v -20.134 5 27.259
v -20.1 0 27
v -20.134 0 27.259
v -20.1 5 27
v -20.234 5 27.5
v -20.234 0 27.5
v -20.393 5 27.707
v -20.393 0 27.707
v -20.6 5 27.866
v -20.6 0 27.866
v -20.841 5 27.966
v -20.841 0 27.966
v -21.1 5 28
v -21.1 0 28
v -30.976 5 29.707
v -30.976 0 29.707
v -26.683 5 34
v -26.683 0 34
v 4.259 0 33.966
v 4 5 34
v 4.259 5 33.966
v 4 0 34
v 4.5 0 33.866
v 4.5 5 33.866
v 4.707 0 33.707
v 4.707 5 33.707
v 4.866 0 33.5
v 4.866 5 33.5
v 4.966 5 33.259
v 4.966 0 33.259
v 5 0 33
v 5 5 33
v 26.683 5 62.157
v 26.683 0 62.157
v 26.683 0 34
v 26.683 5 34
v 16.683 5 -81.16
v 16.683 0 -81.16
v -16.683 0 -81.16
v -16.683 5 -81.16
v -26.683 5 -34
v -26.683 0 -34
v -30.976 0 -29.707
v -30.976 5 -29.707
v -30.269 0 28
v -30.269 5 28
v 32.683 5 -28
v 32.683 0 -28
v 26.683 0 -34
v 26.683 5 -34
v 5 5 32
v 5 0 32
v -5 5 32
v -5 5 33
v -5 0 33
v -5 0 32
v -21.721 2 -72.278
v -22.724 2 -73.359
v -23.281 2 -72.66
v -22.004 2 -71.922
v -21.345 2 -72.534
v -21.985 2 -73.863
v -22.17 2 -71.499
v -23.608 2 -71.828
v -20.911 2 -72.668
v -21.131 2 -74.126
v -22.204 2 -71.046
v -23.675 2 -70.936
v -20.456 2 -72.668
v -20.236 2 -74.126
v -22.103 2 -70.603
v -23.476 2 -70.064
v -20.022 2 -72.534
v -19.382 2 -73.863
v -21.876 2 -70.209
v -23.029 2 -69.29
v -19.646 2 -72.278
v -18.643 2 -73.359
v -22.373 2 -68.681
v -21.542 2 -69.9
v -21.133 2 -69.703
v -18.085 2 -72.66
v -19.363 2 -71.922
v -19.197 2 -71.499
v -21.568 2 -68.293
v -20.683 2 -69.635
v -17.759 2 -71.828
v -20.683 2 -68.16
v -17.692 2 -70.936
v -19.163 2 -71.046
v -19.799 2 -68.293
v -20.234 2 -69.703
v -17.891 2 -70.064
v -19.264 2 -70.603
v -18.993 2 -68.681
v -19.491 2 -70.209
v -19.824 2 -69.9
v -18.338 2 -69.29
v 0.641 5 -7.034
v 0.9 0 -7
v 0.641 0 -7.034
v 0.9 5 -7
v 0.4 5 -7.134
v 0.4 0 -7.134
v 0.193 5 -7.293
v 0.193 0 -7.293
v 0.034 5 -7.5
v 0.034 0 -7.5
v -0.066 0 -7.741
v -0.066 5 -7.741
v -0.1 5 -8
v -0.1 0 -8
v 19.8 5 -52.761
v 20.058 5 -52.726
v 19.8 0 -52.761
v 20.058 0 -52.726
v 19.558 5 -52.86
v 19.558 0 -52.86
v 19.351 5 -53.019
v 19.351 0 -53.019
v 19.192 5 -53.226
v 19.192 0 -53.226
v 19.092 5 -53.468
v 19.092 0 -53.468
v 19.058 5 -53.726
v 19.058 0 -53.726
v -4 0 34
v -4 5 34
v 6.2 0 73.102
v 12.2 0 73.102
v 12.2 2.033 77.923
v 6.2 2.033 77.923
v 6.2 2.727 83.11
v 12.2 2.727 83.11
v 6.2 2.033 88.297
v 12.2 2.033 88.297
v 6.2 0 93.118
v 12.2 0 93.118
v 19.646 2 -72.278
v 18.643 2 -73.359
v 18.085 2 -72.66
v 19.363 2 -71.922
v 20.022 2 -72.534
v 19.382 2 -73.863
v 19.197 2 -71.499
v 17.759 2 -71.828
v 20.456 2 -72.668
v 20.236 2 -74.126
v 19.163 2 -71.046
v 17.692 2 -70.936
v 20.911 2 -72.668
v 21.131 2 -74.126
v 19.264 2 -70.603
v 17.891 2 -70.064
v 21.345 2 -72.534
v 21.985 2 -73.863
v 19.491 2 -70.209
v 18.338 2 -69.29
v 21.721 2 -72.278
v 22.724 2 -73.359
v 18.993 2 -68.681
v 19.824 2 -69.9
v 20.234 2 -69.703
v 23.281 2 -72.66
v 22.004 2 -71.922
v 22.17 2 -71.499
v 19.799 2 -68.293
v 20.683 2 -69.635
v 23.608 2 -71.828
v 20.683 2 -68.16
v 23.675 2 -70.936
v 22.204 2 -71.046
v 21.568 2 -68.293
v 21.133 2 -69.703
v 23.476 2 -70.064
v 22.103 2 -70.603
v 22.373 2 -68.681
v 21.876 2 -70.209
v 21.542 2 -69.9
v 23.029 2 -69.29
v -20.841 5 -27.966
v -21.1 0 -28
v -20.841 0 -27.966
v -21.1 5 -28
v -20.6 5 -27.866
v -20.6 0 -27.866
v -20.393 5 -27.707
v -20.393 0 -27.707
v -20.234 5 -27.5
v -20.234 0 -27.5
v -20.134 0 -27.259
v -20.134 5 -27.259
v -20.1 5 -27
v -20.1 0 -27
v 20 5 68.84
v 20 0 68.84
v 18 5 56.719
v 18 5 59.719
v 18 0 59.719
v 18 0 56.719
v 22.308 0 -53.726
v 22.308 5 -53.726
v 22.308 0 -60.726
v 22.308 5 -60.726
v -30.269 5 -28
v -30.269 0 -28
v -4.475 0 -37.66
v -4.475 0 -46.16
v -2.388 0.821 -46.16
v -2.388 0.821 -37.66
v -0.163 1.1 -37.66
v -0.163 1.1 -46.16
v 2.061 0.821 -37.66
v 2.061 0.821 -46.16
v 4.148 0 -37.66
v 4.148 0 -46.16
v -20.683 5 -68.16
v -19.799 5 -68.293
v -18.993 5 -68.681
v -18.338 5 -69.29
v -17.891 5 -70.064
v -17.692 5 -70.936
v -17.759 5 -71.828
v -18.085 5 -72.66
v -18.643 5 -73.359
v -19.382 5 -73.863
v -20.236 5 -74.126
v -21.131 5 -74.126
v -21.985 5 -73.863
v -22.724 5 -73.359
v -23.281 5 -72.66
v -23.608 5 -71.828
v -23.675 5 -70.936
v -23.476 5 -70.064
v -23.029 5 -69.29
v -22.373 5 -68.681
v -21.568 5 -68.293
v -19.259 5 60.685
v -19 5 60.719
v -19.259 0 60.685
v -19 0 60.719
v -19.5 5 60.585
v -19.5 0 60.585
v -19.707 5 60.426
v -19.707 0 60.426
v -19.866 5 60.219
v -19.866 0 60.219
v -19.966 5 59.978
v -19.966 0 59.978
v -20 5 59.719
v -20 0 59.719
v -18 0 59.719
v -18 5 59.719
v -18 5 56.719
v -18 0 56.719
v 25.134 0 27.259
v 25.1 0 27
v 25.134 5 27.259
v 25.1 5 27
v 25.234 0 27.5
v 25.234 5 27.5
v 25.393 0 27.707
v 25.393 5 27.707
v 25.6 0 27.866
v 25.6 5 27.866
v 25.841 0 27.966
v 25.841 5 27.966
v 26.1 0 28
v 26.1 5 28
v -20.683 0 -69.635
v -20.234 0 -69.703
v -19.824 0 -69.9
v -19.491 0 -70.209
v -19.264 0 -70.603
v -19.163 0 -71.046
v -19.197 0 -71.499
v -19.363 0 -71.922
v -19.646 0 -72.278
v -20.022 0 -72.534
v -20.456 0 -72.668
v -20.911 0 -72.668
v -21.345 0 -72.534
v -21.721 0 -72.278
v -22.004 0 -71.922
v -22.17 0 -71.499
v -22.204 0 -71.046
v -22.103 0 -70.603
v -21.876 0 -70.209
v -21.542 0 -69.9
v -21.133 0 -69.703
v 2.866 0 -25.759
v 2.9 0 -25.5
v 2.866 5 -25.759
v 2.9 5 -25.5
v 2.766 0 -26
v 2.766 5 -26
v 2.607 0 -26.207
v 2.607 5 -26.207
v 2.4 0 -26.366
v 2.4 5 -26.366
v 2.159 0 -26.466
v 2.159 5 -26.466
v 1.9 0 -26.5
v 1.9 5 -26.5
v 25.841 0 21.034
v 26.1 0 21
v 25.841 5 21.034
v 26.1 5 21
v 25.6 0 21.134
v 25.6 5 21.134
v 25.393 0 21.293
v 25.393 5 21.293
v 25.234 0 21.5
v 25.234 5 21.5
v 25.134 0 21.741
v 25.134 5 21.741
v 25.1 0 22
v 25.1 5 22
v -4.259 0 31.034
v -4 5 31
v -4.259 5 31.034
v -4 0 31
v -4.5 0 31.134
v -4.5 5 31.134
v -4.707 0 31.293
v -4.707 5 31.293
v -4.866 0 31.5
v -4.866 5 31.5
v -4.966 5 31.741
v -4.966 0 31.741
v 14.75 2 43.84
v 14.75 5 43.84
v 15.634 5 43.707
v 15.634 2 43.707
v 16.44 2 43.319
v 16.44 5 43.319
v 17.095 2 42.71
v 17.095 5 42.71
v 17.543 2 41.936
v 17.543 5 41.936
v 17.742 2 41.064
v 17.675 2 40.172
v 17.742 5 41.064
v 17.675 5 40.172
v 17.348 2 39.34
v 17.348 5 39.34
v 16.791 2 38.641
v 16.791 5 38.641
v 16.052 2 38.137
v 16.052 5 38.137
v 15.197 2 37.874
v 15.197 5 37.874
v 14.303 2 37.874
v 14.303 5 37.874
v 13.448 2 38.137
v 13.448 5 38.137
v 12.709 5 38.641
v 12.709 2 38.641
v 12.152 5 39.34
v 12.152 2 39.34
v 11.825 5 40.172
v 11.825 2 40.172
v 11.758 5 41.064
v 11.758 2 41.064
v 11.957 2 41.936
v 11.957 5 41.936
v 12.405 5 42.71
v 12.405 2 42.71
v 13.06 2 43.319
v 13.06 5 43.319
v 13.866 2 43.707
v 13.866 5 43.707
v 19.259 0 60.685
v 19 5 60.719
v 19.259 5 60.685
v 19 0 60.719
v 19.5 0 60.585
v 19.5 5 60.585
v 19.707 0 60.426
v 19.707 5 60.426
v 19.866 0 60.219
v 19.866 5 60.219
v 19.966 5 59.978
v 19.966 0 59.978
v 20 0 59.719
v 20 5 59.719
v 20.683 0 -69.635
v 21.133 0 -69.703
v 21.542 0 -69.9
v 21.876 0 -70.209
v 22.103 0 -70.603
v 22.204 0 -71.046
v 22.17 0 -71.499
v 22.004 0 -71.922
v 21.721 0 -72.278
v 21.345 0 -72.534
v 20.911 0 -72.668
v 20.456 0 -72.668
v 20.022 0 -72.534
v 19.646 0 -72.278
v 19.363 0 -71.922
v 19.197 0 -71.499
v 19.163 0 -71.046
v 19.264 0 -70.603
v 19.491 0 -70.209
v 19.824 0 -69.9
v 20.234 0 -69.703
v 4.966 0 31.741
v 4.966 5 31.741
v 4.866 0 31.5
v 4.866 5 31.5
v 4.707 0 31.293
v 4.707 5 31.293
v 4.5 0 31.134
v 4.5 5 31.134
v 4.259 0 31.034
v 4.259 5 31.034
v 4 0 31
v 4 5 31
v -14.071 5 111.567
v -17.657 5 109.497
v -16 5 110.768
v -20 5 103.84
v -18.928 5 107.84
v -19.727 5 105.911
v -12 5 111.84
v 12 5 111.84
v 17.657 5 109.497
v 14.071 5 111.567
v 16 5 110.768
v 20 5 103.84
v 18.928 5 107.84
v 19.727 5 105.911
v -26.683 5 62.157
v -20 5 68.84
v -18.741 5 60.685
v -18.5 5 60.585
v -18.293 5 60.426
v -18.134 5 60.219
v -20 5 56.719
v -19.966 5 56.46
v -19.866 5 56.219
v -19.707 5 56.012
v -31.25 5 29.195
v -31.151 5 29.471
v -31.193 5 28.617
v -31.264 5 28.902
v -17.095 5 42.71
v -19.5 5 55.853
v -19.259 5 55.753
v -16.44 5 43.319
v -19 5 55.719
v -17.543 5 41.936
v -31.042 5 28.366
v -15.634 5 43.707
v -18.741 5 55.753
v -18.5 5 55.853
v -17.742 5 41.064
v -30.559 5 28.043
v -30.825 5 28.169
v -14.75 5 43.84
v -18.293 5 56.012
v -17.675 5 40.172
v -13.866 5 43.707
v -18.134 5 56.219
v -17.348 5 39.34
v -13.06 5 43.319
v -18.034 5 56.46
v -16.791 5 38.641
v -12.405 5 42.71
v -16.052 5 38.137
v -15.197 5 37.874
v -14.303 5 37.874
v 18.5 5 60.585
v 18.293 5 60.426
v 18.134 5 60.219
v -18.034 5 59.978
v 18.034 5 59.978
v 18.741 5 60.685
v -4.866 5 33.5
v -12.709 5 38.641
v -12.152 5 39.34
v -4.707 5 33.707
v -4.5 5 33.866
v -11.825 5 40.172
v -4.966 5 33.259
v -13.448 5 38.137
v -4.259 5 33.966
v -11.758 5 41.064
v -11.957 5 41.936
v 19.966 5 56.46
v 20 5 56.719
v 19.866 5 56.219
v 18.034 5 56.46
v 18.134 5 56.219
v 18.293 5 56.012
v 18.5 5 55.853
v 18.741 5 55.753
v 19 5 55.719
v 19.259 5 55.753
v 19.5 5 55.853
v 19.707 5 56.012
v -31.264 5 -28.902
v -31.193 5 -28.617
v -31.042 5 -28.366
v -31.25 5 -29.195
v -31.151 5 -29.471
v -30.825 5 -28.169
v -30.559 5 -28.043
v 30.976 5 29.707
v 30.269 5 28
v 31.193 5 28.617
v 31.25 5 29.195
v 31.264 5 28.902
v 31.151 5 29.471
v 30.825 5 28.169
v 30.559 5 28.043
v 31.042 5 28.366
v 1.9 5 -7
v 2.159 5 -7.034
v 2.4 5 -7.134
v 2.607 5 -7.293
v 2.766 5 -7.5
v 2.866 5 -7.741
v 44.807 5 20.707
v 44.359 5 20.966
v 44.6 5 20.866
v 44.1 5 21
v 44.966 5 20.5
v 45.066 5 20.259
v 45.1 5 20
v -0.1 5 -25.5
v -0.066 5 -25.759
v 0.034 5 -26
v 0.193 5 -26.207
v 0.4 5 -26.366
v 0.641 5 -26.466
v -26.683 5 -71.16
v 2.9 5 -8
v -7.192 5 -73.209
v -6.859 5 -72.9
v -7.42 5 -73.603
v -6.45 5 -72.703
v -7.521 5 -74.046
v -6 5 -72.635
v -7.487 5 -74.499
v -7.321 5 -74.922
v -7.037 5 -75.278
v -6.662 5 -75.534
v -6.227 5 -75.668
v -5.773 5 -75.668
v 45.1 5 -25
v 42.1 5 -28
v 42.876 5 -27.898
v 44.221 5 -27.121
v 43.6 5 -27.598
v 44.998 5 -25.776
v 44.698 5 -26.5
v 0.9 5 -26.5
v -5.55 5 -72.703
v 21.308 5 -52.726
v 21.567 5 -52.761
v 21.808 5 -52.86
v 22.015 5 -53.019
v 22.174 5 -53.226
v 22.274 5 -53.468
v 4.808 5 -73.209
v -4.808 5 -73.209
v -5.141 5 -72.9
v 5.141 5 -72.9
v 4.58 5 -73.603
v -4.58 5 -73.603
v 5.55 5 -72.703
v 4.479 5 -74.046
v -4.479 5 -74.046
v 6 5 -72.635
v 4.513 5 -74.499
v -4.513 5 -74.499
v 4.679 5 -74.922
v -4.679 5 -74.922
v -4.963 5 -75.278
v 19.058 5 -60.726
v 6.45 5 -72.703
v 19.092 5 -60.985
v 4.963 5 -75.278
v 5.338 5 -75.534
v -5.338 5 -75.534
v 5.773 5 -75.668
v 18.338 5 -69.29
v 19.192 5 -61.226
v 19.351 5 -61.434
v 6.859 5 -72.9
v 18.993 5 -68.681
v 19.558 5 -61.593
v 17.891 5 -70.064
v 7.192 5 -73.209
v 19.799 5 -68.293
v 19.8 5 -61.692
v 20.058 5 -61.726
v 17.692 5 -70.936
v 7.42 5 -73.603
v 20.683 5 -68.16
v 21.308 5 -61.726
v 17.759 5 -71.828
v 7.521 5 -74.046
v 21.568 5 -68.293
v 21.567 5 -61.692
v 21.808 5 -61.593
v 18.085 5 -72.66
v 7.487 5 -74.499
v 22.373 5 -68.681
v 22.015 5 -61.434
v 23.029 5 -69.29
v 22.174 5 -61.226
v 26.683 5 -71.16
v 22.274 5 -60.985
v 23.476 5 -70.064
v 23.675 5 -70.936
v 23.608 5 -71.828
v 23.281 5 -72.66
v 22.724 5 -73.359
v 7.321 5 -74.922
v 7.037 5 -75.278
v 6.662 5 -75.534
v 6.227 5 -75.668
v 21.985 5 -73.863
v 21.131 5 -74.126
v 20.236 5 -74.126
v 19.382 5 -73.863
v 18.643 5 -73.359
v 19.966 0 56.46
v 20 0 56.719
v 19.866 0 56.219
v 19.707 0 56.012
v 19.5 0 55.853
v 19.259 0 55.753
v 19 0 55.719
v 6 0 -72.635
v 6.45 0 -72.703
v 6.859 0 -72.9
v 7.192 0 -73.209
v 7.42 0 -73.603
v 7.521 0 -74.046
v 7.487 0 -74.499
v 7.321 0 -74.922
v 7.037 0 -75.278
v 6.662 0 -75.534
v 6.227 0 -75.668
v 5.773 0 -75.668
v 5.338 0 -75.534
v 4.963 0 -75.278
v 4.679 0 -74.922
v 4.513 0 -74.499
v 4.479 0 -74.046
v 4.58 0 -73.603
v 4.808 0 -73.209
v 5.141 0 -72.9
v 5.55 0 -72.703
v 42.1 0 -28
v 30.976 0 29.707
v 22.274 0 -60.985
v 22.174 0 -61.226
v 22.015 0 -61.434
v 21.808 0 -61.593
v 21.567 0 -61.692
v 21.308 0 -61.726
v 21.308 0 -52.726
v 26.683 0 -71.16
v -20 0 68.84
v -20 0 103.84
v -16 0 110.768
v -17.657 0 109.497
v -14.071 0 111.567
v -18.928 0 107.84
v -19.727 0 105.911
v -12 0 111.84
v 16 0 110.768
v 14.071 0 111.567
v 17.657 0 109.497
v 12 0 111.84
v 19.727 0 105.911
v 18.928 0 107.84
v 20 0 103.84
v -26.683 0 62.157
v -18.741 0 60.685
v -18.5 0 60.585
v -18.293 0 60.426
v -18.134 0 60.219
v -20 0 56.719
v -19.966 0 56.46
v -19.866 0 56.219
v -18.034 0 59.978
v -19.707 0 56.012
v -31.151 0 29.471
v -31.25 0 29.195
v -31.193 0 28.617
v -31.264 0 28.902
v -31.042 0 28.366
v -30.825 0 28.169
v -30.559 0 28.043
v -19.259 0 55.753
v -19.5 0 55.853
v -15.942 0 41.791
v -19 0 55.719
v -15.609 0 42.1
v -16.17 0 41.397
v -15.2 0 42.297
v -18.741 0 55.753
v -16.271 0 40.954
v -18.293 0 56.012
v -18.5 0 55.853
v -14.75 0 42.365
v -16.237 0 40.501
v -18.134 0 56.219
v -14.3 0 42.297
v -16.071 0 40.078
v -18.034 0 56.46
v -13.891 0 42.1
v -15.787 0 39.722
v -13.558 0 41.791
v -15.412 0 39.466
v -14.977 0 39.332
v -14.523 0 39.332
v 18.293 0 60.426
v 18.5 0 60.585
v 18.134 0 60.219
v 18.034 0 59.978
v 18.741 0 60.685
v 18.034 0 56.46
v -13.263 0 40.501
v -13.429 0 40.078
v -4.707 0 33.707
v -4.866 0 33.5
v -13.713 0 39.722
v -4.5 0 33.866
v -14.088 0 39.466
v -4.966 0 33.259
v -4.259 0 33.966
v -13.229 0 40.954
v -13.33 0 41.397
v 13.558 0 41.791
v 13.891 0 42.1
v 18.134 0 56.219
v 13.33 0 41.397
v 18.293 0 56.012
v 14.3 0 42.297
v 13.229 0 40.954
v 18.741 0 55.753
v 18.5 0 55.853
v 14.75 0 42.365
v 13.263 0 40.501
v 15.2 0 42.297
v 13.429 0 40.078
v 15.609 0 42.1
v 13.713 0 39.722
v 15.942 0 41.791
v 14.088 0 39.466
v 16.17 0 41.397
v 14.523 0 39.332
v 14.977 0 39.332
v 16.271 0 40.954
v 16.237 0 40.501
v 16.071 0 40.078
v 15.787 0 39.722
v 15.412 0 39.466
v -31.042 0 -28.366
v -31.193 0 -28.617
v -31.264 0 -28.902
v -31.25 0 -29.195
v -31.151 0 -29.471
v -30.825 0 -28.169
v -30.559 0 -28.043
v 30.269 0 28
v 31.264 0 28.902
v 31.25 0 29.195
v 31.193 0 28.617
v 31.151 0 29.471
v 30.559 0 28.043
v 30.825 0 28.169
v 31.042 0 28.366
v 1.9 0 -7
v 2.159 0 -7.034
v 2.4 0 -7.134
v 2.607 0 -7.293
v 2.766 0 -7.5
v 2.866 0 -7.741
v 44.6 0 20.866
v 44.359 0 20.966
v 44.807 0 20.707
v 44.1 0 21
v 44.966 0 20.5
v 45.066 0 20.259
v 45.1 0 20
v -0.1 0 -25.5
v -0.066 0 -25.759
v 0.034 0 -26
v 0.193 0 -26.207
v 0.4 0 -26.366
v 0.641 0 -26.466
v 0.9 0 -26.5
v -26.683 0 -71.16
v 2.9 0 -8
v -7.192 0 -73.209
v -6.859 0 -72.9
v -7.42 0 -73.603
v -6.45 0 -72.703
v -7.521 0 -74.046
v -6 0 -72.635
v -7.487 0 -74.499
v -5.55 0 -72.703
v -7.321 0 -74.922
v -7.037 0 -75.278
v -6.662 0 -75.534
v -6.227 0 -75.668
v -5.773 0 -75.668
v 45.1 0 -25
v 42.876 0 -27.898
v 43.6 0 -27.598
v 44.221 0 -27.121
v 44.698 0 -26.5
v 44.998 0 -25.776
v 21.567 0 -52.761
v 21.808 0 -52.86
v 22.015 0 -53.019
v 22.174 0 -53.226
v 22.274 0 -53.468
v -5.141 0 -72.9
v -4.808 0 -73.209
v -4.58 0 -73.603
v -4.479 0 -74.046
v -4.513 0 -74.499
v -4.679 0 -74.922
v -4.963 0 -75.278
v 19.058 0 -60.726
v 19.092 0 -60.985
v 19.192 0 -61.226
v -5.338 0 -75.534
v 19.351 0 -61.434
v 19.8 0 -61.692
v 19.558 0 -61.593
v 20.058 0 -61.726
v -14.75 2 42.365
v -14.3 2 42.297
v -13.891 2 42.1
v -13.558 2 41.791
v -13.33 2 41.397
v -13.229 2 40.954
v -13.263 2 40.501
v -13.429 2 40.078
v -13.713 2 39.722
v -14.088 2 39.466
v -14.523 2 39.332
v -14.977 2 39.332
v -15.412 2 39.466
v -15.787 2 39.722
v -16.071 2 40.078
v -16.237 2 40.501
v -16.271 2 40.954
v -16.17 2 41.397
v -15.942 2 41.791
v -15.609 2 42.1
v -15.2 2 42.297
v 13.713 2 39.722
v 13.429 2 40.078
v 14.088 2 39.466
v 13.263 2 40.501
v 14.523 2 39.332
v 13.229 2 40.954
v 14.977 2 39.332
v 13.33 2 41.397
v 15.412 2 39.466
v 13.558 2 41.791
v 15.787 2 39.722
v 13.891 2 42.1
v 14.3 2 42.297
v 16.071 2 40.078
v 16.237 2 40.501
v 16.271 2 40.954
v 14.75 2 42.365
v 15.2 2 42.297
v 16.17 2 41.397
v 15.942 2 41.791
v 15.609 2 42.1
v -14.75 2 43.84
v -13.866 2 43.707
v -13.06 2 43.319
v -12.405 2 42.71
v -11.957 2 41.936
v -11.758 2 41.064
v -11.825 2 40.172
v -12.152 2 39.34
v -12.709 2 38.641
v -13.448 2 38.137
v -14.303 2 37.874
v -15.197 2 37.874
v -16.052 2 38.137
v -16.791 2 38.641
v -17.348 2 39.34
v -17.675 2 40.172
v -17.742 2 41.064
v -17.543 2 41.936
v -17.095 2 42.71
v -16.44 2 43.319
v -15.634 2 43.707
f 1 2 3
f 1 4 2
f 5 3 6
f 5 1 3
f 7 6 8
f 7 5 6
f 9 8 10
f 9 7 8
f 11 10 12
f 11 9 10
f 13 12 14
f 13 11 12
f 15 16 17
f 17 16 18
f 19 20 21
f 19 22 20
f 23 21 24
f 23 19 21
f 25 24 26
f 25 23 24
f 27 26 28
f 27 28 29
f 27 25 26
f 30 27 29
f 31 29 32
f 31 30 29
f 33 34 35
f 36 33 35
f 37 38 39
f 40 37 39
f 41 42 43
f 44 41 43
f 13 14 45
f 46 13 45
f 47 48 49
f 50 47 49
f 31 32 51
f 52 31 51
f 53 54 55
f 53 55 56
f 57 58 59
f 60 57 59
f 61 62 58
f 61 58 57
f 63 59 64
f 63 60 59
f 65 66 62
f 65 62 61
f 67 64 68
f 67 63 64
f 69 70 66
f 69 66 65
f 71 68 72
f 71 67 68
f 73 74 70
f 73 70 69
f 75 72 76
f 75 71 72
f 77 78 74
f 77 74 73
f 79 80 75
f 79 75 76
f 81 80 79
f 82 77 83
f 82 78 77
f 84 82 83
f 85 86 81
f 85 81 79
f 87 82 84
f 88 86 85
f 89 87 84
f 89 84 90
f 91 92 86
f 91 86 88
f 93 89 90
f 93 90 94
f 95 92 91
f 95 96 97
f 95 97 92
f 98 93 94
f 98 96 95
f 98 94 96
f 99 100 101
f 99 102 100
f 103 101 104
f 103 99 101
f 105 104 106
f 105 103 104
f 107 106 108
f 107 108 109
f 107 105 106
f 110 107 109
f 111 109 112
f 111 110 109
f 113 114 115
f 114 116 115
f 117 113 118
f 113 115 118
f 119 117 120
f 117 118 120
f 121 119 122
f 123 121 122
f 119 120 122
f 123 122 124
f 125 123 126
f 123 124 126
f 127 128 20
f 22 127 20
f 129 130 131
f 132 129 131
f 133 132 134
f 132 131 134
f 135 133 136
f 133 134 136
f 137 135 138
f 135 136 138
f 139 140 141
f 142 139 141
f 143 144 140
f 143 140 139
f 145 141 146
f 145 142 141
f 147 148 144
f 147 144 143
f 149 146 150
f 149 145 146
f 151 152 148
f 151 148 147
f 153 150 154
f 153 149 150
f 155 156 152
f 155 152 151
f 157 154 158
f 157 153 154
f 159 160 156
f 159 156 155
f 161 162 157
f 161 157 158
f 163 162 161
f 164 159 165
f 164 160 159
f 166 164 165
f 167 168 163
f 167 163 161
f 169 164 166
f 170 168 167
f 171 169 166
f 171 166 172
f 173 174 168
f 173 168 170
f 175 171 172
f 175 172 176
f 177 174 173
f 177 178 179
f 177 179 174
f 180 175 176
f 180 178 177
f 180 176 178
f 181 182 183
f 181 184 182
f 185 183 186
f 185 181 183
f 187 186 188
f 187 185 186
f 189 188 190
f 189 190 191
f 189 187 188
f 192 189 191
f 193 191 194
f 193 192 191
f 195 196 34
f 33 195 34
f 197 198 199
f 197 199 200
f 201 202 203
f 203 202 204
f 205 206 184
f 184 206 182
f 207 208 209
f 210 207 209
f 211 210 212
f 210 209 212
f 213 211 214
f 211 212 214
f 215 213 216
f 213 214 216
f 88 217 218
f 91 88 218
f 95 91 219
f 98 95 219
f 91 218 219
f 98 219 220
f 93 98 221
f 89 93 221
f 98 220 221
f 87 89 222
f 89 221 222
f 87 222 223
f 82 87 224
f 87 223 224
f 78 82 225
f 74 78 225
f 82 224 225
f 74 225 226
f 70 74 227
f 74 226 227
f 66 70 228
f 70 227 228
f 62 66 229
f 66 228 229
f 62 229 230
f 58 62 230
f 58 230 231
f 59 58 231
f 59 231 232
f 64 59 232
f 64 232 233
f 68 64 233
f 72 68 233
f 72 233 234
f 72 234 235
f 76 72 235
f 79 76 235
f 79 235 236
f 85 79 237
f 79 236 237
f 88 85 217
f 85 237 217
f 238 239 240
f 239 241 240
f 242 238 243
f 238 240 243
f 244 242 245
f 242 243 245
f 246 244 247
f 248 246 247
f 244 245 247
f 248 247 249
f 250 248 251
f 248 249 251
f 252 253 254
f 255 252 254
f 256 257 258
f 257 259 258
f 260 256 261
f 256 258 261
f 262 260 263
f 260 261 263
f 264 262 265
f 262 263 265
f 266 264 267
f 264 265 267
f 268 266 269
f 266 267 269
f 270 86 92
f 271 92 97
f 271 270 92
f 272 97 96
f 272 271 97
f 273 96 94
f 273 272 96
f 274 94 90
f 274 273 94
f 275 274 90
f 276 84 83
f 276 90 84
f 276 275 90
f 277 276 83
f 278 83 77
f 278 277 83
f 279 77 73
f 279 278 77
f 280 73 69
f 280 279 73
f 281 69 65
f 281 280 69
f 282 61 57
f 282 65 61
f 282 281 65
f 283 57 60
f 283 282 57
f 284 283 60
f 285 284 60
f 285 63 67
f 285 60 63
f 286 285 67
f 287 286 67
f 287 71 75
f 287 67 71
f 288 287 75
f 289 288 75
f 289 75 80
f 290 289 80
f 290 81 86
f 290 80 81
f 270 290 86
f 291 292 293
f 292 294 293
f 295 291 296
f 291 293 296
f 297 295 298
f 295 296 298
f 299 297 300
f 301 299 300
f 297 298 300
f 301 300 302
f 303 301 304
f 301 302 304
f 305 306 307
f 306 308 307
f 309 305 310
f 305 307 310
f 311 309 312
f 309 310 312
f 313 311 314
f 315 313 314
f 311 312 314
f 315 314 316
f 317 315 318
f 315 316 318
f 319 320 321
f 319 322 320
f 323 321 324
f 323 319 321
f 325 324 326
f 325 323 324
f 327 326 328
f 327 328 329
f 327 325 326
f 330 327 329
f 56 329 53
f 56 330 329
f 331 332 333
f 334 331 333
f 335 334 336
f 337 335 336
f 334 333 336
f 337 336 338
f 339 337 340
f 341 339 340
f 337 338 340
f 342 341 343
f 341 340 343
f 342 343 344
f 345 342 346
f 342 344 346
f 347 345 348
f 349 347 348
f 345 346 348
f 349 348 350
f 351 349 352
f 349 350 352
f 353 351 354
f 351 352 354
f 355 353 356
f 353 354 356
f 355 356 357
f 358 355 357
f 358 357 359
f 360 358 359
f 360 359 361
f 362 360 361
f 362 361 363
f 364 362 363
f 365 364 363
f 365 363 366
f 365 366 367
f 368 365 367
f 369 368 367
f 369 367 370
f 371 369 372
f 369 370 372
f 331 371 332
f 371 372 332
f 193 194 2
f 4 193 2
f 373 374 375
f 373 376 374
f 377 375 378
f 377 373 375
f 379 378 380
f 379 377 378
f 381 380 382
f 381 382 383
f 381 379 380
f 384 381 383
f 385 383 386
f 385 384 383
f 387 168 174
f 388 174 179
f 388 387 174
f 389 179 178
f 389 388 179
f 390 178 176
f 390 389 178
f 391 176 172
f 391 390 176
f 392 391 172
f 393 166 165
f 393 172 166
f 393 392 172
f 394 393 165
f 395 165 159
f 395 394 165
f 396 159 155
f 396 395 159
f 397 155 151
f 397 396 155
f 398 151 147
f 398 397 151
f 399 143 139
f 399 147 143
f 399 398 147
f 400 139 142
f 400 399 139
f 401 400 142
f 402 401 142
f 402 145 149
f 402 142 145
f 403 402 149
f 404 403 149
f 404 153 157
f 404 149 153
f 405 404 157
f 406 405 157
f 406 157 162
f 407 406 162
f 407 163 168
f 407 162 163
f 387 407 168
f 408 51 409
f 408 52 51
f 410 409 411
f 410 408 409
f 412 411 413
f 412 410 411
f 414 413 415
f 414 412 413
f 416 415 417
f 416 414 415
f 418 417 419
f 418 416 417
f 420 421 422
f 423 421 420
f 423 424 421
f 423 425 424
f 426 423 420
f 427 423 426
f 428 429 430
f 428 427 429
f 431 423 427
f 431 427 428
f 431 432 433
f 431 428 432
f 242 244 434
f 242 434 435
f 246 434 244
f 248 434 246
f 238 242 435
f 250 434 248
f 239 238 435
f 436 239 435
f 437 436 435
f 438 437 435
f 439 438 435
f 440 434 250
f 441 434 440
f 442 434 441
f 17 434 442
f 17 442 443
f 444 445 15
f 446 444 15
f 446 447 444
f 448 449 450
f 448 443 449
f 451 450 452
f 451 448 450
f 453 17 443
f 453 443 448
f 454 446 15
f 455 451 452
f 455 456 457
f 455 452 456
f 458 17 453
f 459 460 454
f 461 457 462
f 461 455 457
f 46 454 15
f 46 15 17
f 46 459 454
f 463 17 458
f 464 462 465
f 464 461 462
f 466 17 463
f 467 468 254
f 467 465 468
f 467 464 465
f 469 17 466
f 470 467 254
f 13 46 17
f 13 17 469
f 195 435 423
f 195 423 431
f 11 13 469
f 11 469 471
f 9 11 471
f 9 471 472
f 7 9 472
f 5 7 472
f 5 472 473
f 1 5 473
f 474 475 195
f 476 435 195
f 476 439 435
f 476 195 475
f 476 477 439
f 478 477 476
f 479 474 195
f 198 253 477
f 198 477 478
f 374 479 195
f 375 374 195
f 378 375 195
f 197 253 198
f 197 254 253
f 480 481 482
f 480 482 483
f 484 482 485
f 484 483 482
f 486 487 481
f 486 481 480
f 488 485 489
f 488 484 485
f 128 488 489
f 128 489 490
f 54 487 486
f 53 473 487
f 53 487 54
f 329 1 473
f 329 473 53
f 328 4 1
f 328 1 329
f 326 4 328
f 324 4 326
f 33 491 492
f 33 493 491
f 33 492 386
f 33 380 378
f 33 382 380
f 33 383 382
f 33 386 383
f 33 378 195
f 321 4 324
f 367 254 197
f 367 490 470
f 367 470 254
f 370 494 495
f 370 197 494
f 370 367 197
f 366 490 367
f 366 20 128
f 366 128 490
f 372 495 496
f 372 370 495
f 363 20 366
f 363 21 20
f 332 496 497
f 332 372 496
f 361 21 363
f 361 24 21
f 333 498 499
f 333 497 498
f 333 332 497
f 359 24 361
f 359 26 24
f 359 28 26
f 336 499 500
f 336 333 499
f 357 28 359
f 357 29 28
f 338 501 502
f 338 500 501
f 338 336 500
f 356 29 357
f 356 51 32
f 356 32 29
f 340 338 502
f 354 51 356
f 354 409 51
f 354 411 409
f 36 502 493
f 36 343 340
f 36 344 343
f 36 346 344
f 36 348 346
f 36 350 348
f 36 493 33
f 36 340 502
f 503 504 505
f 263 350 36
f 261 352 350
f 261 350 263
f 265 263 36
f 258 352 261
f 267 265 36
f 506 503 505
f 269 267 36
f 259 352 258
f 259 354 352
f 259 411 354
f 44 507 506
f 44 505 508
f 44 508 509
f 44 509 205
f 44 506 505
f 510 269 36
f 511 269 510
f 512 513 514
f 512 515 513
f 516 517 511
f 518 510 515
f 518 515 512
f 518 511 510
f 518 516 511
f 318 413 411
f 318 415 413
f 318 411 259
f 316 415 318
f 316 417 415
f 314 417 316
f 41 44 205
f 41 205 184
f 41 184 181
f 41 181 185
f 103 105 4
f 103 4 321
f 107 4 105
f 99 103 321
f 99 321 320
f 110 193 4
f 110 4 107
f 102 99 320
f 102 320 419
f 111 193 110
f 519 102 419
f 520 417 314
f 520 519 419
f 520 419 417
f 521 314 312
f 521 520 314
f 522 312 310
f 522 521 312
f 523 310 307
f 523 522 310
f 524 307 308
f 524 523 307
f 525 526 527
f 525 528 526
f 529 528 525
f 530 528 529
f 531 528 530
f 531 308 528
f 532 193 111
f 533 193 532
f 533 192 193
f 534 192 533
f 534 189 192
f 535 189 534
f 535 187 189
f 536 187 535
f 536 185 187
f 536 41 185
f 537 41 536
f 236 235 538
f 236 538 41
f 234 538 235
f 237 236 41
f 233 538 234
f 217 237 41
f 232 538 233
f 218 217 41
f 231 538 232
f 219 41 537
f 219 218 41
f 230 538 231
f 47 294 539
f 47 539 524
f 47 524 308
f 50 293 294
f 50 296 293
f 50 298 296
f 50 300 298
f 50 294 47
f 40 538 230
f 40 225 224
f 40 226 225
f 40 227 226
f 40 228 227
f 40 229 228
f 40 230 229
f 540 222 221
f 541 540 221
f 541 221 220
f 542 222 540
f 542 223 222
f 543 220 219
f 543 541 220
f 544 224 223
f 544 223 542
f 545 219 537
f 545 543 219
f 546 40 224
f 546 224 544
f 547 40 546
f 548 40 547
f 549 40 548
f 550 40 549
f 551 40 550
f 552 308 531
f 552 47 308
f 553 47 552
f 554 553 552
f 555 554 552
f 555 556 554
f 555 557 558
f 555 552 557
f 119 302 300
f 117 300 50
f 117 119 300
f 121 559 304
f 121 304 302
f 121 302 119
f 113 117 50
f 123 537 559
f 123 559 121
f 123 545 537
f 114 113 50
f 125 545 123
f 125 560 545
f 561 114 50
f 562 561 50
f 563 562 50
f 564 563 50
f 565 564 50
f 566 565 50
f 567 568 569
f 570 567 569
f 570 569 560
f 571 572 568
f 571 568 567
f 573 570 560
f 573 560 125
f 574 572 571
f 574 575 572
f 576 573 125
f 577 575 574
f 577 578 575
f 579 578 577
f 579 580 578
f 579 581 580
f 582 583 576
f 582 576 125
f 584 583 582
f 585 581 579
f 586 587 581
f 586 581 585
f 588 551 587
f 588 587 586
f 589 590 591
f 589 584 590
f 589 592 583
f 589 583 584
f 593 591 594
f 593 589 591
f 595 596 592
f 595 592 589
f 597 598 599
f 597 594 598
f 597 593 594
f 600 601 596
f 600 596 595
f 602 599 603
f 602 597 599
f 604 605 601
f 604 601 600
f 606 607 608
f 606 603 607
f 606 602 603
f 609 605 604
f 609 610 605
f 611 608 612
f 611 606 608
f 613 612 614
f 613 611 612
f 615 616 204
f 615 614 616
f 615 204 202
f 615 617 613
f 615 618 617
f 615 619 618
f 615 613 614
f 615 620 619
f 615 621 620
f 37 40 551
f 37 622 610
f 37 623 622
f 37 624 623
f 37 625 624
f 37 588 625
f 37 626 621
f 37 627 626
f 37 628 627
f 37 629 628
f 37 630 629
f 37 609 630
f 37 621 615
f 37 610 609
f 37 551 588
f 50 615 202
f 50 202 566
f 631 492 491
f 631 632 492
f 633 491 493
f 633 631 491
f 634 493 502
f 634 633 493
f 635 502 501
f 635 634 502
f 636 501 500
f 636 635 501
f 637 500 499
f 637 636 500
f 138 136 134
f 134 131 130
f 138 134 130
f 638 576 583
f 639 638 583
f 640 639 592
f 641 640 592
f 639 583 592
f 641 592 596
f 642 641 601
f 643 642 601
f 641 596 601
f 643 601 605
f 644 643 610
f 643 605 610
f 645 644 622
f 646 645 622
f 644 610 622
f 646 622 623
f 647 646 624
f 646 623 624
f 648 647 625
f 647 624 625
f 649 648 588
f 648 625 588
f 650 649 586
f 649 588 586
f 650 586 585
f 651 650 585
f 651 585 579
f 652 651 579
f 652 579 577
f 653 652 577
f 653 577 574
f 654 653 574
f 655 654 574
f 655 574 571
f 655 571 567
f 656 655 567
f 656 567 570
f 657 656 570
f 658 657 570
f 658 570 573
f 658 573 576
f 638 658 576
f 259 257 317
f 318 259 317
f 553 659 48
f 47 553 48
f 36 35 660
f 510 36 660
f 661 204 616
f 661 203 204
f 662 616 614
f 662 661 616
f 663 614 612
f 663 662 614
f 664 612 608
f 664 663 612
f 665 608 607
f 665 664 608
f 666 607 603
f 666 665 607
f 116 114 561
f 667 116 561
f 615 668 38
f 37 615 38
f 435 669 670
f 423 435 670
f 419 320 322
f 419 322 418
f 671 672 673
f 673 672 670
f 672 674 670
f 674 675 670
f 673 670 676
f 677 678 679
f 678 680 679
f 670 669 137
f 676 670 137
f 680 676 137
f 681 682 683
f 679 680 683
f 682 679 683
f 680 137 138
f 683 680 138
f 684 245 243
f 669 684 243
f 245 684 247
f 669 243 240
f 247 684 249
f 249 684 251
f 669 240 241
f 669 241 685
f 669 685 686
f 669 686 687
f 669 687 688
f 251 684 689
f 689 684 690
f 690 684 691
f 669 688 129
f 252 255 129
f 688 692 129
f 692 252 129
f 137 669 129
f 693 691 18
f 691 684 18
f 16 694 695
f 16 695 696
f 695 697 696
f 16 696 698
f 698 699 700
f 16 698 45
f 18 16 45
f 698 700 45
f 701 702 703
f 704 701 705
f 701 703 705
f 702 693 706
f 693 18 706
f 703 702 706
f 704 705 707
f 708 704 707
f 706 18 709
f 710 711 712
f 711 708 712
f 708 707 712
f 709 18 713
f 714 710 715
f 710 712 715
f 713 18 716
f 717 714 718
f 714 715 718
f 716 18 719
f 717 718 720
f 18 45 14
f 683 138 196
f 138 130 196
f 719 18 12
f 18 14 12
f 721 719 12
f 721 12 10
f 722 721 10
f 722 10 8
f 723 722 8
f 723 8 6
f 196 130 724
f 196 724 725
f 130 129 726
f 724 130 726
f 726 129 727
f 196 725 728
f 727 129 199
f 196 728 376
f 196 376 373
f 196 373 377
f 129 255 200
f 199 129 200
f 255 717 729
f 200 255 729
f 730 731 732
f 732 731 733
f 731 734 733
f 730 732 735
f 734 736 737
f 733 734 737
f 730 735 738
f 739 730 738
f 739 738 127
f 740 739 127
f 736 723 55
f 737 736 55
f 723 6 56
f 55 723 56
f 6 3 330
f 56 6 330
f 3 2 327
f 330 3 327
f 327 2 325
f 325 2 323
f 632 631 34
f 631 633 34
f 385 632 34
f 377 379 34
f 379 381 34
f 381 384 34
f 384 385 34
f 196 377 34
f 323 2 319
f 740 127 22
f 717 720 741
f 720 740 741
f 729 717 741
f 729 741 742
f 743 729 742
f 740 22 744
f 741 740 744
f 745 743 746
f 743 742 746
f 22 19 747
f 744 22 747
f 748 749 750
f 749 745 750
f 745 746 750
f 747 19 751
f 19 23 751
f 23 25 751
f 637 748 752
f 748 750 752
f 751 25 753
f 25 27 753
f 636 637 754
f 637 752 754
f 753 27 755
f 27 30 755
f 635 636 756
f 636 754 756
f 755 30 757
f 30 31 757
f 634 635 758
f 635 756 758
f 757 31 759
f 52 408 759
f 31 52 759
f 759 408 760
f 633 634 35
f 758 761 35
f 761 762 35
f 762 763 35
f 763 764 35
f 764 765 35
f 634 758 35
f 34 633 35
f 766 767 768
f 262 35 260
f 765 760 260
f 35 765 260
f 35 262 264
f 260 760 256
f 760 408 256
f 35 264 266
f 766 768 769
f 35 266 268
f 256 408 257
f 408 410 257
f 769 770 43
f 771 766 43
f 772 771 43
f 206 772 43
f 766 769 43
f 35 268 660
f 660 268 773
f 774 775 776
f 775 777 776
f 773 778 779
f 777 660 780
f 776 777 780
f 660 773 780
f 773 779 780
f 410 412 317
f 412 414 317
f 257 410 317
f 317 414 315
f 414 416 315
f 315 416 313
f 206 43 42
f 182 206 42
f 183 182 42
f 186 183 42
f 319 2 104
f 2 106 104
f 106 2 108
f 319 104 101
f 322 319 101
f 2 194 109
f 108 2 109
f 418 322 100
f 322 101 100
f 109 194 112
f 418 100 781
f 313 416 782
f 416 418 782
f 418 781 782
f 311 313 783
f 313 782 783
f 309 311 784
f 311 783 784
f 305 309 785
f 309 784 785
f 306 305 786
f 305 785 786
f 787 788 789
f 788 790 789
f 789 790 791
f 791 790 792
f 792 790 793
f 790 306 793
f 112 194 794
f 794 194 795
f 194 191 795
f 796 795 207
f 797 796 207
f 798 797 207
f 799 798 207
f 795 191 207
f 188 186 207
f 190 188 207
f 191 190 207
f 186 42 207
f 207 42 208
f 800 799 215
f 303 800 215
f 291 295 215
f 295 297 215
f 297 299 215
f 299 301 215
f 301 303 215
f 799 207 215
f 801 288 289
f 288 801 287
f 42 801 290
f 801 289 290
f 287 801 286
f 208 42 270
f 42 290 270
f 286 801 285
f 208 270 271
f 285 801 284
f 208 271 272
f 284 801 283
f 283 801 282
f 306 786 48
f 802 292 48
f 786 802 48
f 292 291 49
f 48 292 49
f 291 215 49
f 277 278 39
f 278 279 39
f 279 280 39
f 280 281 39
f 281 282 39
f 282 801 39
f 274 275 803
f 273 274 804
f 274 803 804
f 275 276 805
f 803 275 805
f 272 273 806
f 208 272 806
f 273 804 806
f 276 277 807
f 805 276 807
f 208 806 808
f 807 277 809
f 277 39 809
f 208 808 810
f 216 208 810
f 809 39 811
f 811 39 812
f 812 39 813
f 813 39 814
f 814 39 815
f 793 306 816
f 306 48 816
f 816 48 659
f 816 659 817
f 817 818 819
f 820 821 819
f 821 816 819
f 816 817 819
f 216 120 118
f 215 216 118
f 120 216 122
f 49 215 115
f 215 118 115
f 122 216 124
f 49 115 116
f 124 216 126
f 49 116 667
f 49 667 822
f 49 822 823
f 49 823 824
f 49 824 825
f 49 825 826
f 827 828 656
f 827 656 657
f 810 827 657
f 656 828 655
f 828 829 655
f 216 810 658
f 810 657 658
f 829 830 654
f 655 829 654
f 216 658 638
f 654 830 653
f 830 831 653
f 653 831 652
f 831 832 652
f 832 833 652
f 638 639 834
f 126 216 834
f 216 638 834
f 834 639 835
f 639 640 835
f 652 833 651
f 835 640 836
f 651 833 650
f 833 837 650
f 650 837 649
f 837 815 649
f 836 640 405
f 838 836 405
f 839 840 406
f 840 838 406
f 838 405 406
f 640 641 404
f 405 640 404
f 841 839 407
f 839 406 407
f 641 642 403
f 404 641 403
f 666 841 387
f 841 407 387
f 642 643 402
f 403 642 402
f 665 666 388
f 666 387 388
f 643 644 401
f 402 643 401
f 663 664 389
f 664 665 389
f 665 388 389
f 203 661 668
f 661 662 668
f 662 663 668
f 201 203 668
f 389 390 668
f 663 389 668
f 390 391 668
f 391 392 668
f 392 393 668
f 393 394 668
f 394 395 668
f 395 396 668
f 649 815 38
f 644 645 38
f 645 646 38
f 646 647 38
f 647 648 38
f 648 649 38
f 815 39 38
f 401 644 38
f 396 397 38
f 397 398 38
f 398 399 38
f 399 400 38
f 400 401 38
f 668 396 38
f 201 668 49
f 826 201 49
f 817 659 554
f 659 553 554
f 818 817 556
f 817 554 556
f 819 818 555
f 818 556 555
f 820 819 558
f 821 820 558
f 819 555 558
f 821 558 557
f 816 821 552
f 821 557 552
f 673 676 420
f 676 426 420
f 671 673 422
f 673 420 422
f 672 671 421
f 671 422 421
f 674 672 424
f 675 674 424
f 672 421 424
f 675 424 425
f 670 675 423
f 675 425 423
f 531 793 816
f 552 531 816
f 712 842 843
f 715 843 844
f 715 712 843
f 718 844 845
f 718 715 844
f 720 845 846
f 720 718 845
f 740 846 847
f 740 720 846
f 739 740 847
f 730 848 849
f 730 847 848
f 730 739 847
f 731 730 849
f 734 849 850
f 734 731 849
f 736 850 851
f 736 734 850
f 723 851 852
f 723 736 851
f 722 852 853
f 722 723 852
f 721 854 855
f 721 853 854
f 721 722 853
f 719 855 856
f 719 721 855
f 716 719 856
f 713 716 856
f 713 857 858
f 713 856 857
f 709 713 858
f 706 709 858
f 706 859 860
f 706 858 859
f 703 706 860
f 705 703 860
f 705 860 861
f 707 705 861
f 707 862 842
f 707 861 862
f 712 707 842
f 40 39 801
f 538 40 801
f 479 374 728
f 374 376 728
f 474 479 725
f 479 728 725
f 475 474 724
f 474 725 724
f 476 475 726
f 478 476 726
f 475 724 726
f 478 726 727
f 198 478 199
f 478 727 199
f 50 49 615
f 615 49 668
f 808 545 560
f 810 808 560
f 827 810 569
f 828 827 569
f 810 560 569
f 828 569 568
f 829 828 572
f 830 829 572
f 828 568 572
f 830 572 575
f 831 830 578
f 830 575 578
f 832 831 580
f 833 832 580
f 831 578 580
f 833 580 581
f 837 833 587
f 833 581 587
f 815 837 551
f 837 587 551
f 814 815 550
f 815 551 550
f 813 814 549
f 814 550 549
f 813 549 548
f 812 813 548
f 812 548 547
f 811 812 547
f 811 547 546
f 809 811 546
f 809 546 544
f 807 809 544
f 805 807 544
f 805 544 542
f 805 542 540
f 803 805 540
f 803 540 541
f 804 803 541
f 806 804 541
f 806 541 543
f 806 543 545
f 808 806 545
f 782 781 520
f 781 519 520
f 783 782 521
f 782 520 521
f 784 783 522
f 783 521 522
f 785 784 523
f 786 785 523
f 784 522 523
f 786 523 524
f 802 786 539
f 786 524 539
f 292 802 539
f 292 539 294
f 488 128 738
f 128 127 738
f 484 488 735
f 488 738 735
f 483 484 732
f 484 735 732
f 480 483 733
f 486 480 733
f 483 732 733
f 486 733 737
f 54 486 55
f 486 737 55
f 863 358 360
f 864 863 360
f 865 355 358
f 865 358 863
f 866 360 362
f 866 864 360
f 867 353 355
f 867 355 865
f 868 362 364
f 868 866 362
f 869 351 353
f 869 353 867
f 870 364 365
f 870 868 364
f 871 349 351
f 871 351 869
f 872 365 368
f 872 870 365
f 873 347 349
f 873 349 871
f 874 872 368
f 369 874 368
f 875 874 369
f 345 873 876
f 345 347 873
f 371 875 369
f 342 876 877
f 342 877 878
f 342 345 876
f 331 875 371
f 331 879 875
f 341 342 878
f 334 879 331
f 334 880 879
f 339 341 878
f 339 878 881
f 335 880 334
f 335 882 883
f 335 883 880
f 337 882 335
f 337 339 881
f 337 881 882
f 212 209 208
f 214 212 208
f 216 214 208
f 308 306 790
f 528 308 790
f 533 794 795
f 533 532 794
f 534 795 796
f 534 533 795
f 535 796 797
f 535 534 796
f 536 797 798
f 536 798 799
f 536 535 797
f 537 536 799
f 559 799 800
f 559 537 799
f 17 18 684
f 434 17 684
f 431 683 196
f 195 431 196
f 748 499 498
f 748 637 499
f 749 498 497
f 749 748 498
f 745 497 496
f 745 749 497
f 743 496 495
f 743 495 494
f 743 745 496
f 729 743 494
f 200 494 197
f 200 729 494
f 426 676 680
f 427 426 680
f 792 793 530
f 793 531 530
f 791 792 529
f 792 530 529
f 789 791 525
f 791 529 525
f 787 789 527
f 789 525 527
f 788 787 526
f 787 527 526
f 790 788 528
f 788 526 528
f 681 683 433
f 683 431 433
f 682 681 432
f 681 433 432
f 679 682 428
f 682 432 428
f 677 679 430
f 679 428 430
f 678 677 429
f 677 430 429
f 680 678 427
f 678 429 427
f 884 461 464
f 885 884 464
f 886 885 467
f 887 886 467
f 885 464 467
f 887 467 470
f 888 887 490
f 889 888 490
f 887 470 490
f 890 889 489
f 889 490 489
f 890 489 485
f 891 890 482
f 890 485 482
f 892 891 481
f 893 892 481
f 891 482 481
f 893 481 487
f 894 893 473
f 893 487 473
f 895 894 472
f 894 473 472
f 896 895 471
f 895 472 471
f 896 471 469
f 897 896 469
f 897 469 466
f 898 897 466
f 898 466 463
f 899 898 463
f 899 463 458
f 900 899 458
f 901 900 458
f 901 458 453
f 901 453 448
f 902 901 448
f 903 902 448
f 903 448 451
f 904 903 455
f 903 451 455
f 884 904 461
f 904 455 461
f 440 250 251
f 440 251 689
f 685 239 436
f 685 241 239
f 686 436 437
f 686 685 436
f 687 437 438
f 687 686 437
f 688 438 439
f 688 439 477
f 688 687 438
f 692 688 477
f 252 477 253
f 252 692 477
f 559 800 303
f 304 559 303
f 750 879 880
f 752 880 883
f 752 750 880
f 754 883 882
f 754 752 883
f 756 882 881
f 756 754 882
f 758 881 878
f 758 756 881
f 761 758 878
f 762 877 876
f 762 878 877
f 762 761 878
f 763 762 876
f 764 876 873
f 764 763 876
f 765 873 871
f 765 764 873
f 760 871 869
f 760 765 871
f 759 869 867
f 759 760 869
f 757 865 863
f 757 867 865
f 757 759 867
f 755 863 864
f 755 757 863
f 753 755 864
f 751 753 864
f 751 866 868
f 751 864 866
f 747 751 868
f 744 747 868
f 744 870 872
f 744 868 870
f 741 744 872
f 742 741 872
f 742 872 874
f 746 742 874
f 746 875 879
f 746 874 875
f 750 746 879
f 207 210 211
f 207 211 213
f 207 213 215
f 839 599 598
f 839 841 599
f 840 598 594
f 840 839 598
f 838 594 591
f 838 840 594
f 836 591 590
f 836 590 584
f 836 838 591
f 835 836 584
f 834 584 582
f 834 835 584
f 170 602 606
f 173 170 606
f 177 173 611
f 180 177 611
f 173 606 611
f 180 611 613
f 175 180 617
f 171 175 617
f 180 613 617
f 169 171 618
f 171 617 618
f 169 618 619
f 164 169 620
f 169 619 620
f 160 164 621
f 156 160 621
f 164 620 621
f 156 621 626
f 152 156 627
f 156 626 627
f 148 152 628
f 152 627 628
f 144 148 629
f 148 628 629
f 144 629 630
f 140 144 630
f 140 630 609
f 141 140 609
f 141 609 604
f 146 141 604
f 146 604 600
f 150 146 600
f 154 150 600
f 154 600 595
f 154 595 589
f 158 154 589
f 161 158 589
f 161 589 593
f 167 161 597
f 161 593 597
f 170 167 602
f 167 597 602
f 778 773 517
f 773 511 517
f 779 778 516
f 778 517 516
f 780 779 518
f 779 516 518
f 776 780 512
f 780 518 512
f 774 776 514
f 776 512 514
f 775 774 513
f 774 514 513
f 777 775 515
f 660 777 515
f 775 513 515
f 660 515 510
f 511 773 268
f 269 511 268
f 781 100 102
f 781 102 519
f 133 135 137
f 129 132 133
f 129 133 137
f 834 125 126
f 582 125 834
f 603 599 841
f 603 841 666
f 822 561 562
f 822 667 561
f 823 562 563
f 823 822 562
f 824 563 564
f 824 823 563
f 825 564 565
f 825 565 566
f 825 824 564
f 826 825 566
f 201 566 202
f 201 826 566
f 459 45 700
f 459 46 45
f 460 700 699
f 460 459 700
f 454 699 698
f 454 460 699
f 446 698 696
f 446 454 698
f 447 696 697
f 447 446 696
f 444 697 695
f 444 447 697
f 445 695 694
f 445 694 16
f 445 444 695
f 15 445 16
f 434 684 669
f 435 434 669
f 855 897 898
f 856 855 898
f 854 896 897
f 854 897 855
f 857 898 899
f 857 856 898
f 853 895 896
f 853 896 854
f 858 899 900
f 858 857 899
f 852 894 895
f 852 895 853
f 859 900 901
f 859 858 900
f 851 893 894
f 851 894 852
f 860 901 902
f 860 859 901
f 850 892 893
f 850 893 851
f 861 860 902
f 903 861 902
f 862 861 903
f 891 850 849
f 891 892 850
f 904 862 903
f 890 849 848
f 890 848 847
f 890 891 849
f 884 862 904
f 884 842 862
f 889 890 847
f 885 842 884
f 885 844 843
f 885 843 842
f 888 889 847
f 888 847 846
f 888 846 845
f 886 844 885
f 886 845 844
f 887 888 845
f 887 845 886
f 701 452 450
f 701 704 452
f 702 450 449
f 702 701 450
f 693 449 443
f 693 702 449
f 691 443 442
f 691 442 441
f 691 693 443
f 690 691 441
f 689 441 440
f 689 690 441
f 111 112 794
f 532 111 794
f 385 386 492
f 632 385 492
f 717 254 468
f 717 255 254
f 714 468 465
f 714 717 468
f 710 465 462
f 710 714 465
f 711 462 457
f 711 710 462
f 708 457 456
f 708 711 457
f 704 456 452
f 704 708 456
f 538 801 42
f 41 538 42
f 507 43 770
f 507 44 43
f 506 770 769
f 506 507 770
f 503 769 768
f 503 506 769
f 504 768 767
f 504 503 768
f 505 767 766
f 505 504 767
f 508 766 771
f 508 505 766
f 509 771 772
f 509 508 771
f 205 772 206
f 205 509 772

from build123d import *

# Parameters (mm, degrees)
SKETCH1_R           = 1.525
SKETCH1_W           = 3
SKETCH1_H           = 19.5
BOSS_EXTRUDE1_DEPTH = 5
FILLET4_R           = 3
FILLET5_R           = 1
SKETCH4_R           = 3
CUT_EXTRUDE1_DEPTH  = 3
FILLET6_R           = 8
SKETCH6_R           = 19.727216355
CUT_EXTRUDE2_DEPTH  = 6
SKETCH9_R           = 9
CUT_EXTRUDE3_DEPTH  = 8.5
SKETCH11_W          = 2
SKETCH11_H          = 5
SKETCH11_W_2        = 10
SKETCH11_H_2        = 3
CUT_EXTRUDE4_DEPTH  = 6
FILLET7_R           = 1
SKETCH13_R          = 1.525
SKETCH13_W          = 3.25
SKETCH13_H          = 9
CUT_EXTRUDE5_DEPTH  = 6
FILLET8_R           = 1


with BuildPart() as part:
    # Sketch1 → Boss-Extrude1 (new body)
    with BuildSketch(Plane(origin=(0, 0, 0), x_dir=(1, 0, 0), z_dir=(0, 1, 0))):
        Polygon((-26.68337521, 71.16), (-26.68337521, 34), (-32.68337521, 28), (-20.1, 28), (-20.1, -28), (-32.68337521, -28), (-26.68337521, -34), (-26.68337521, -62.15662479), (-20, -68.84), (-20, -111.84), (20, -111.84), (20, -68.84), (26.68337521, -62.15662479), (26.68337521, -34), (32.68337521, -28), (25.1, -28), (25.1, -21), (45.1, -21), (45.1, 28), (32.68337521, 28), (26.68337521, 34), (26.68337521, 71.16), (16.68337521, 81.16), (-16.68337521, 81.16), align=None)
        with Locations(Location((-20.68337521, 71.16, 0), (0, 0, 270))):
            Circle(SKETCH1_R, mode=Mode.SUBTRACT)
        with Locations(Location((20.68337521, 71.16, 0), (0, 0, 270))):
            Circle(SKETCH1_R, mode=Mode.SUBTRACT)
        with Locations((1.4, 16.75)):
            Rectangle(SKETCH1_W, SKETCH1_H, mode=Mode.SUBTRACT)
        with Locations(Location((14.75, -40.84, 0), (0, 0, 270))):
            Circle(SKETCH1_R, mode=Mode.SUBTRACT)
        with Locations(Location((-14.75, -40.84, 0), (0, 0, 270))):
            Circle(SKETCH1_R, mode=Mode.SUBTRACT)
    extrude(amount=BOSS_EXTRUDE1_DEPTH)

    # Fillet4
    fillet4_edges = [part.edges().sort_by_distance(p)[0] for p in [
        (45.1, 2.5, -28),
    ]]
    fillet(fillet4_edges, radius=FILLET4_R)

    # Fillet5
    fillet5_edges = [part.edges().sort_by_distance(p)[0] for p in [
        (-0.1, 2.5, -26.5),
        (-0.1, 2.5, -7),
        (2.9, 2.5, -7),
        (2.9, 2.5, -26.5),
        (45.1, 2.5, 21),
        (25.1, 2.5, 21),
        (25.1, 2.5, 28),
        (32.68337521, 2.5, 28),
        (-32.68337521, 2.5, 28),
        (-20.1, 2.5, 28),
        (-20.1, 2.5, -28),
        (-32.68337521, 2.5, -28),
    ]]
    fillet(fillet5_edges, radius=FILLET5_R)

    # Sketch4 → Cut-Extrude1 (cut)
    with BuildSketch(Plane(origin=(0, 5, 0), x_dir=(1, 0, 0), z_dir=(0, 1, 0))):
        with Locations(Location((-20.68337521, 71.16, 0), (0, 0, 270))):
            Circle(SKETCH4_R)
        with Locations(Location((20.68337521, 71.16, 0), (0, 0, 270))):
            Circle(SKETCH4_R)
        with Locations(Location((-14.75, -40.84, 0), (0, 0, 270))):
            Circle(SKETCH4_R)
        with Locations(Location((14.75, -40.84, 0), (0, 0, 270))):
            Circle(SKETCH4_R)
    extrude(amount=-CUT_EXTRUDE1_DEPTH, mode=Mode.SUBTRACT)

    # Fillet6
    fillet6_edges = [part.edges().sort_by_distance(p)[0] for p in [
        (20, 2.5, 111.84),
        (-20, 2.5, 111.84),
    ]]
    fillet(fillet6_edges, radius=FILLET6_R)

    # Sketch6 → Cut-Extrude2 (cut)
    with BuildSketch(Plane(origin=(12.2, 0, 0), x_dir=(0, 0, -1), z_dir=(1, 0, 0))):
        with Locations((-83.11, -17)):
            Circle(SKETCH6_R)
    extrude(amount=-CUT_EXTRUDE2_DEPTH, mode=Mode.SUBTRACT)

    # Sketch9 → Cut-Extrude3 (cut)
    with BuildSketch(Plane(origin=(0, 0, -46.16), x_dir=(-1, 0, 0), z_dir=(0, 0, -1))):
        with Locations((0.16337521, -7.9)):
            Circle(SKETCH9_R)
    extrude(amount=-CUT_EXTRUDE3_DEPTH, mode=Mode.SUBTRACT)

    # Sketch11 → Cut-Extrude4 (cut)
    with BuildSketch(Plane(origin=(0, 5, 0), x_dir=(1, 0, 0), z_dir=(0, 1, 0))):
        with Locations((-19, -58.219322965)):
            Rectangle(SKETCH11_W, SKETCH11_H)
        with Locations((19, -58.219322965)):
            Rectangle(SKETCH11_W, SKETCH11_H)
        with Locations((0, -32.5)):
            Rectangle(SKETCH11_W_2, SKETCH11_H_2)
    extrude(amount=-CUT_EXTRUDE4_DEPTH, mode=Mode.SUBTRACT)

    # Fillet7
    fillet7_edges = [part.edges().sort_by_distance(p)[0] for p in [
        (-18, 2.5, 55.719322965),
        (-20, 2.5, 55.719322965),
        (-18, 2.5, 60.719322965),
        (-20, 2.5, 60.719322965),
        (20, 2.5, 60.719322965),
        (18, 2.5, 60.719322965),
        (18, 2.5, 55.719322965),
        (20, 2.5, 55.719322965),
        (5, 2.5, 31),
        (5, 2.5, 34),
        (-5, 2.5, 34),
        (-5, 2.5, 31),
    ]]
    fillet(fillet7_edges, radius=FILLET7_R - 0.0001)  # a hair under: the kernel refuses the full size

    # Sketch13 → Cut-Extrude5 (cut)
    with BuildSketch(Plane(origin=(0, 5, 0), x_dir=(1, 0, 0), z_dir=(0, 1, 0))):
        with Locations(Location((-6, 74.16, 0), (0, 0, 270))):
            Circle(SKETCH13_R)
        with Locations(Location((6, 74.16, 0), (0, 0, 270))):
            Circle(SKETCH13_R)
        with Locations((20.68337521, 57.226482401)):
            Rectangle(SKETCH13_W, SKETCH13_H)
    extrude(amount=-CUT_EXTRUDE5_DEPTH, mode=Mode.SUBTRACT)

    # Fillet8
    fillet8_edges = [part.edges().sort_by_distance(p)[0] for p in [
        (22.30837521, 2.5, -61.726482401),
        (22.30837521, 2.5, -52.726482401),
        (19.05837521, 2.5, -52.726482401),
        (19.05837521, 2.5, -61.726482401),
    ]]
    fillet(fillet8_edges, radius=FILLET8_R)


solid = part.part
